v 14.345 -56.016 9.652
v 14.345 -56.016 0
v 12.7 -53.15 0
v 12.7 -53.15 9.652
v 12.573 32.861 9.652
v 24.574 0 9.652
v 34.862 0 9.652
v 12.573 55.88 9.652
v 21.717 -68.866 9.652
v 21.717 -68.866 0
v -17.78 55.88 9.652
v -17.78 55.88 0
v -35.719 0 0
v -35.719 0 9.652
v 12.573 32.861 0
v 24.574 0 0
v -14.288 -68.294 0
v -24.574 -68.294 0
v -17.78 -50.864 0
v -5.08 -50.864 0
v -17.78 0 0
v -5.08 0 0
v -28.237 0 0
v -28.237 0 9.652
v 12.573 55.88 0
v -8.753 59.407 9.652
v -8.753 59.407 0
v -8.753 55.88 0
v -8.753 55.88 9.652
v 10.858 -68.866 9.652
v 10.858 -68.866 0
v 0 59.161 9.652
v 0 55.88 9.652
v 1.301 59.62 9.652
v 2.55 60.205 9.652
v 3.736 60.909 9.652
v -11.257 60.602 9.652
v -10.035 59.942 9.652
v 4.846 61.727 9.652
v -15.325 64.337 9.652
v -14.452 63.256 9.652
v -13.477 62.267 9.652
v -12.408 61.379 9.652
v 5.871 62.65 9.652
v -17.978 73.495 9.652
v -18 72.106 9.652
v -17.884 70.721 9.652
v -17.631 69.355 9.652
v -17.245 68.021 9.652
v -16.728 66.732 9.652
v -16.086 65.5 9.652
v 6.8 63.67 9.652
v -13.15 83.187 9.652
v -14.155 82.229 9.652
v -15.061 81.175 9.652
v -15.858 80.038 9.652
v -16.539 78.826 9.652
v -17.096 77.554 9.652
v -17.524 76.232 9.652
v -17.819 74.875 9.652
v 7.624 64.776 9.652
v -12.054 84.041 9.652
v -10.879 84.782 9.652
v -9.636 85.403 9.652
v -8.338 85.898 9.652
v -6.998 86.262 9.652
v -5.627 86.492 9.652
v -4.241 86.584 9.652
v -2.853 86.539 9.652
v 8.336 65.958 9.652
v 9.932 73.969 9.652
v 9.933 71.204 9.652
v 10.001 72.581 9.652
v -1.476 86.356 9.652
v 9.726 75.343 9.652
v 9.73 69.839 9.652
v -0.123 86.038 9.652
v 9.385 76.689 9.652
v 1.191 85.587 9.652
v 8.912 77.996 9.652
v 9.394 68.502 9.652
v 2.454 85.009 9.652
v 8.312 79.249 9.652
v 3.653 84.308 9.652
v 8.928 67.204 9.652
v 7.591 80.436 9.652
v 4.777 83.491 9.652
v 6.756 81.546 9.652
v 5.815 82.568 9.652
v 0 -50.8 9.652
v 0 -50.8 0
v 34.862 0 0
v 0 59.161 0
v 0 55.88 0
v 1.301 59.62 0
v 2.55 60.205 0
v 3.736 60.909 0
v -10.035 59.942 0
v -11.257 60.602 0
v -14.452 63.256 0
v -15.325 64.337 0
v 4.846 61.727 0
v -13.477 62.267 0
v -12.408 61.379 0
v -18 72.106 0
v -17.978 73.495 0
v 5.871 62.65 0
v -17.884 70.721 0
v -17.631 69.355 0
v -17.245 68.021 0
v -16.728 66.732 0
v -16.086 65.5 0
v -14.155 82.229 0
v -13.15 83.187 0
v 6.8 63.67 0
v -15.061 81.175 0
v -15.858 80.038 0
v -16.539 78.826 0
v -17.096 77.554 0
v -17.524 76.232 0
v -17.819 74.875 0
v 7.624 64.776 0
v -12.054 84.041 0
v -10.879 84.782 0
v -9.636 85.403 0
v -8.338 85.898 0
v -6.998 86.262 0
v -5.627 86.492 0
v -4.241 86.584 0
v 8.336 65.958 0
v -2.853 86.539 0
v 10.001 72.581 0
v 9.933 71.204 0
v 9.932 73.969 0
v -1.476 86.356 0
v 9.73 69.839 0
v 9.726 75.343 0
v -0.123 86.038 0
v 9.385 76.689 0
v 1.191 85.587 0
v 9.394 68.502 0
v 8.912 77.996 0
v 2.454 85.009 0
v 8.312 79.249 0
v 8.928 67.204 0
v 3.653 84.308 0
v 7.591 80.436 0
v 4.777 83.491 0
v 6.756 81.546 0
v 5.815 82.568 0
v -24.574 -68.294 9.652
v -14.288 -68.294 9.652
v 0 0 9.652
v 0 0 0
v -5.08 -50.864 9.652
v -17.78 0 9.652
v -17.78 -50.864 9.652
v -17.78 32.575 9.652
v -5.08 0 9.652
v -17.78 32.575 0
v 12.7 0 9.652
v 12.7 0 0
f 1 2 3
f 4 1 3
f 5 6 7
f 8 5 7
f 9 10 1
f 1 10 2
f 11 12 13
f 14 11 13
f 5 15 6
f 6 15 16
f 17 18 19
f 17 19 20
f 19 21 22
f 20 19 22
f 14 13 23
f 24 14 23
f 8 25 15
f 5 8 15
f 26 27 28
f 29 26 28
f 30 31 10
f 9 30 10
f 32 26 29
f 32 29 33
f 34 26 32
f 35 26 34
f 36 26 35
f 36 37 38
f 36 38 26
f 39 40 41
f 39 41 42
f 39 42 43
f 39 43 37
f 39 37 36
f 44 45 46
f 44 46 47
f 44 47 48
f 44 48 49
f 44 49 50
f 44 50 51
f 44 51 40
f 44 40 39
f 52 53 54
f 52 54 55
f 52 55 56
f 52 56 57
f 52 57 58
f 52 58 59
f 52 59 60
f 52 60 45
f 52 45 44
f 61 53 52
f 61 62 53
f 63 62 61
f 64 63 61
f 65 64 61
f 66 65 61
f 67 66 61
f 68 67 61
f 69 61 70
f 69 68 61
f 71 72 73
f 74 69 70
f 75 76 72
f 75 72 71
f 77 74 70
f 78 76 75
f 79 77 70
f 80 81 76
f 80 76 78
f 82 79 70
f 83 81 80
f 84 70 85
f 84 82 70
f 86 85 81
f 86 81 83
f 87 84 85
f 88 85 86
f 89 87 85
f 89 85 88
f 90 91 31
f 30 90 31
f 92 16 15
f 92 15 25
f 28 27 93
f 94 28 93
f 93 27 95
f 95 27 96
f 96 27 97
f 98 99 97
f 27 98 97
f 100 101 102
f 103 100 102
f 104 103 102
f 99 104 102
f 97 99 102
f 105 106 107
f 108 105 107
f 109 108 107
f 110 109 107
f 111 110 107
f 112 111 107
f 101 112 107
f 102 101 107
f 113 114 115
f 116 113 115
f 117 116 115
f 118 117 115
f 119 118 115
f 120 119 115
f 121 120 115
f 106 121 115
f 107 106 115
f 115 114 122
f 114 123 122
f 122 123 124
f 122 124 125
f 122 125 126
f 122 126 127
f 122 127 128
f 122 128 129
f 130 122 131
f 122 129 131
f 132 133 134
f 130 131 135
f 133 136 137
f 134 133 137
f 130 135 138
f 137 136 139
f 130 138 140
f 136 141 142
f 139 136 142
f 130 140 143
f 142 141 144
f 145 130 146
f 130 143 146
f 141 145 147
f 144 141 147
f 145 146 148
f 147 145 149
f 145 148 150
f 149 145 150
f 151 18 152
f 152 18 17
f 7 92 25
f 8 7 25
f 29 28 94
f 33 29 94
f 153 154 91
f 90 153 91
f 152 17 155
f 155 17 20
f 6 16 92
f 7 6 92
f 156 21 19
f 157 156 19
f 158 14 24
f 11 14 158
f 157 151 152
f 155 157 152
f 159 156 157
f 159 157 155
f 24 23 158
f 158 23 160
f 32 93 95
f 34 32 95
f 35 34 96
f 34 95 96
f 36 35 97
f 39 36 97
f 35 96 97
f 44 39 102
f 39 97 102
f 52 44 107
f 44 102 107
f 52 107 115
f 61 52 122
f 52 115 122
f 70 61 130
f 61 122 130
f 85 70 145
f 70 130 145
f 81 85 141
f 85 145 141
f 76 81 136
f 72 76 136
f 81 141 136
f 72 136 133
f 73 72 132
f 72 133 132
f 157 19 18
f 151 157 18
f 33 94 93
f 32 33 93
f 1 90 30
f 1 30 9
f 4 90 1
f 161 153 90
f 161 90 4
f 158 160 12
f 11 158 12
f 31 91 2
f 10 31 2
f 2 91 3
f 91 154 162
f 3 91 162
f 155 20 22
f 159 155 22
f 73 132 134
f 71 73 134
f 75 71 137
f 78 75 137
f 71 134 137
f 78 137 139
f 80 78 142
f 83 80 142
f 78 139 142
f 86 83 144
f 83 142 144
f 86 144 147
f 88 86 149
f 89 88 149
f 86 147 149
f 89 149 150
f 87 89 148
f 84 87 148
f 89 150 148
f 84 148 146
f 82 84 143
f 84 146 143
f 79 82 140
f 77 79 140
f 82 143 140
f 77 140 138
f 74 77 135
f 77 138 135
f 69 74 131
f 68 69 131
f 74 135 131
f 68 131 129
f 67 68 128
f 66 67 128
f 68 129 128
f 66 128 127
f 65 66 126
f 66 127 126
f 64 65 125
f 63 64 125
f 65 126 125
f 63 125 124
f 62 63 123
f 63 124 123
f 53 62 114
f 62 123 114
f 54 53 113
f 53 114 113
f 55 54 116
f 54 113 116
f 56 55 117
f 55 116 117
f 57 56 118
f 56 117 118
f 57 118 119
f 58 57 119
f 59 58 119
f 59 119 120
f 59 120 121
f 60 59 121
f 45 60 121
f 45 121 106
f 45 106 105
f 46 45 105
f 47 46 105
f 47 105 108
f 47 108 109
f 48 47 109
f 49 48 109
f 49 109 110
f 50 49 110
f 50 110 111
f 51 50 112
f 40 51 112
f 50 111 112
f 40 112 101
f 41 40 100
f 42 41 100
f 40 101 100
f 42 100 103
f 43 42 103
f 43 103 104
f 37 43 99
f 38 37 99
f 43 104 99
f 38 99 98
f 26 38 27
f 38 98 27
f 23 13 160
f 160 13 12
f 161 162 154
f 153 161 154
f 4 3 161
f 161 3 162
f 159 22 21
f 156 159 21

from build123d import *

# Parameters (mm, degrees)
F1_DEPTH = 9.652


with BuildPart() as f1:
    # F0 (on Top) → F1 (new body)
    with BuildSketch(Plane.XY):
        Polygon((12.7, -50.8), (0, -50.8), (10.8585, -68.865746), (21.717001, -68.865746), (14.344779, -56.016282), (12.7, -53.149503), align=None)
        Polygon((-14.287501, -68.294249), (-5.08, -50.863501), (-17.78, -50.863501), (-24.5745, -68.294249), align=None)
        Polygon((-28.237476, 0), (-17.78, 32.575499), (-17.78, 55.88), (-35.71875, 0), align=None)
        Polygon((12.573, 55.88), (12.573, 32.861251), (24.5745, 0), (34.861501, 0), align=None)
        with BuildLine():
            ThreePointArc((-8.752791, 59.406579), (-4.396076, 58.582172), (0, 59.161075))
            ThreePointArc((0, 59.161075), (7.225944, 64.212816), (10.001247, 72.581331))
            ThreePointArc((10.001247, 72.581331), (-12.0538, 84.040913), (-8.752791, 59.406579))
        make_face()
        Polygon((12.573, 0), (0, 0), (0, -50.8), (12.7, -50.8), (12.7, 0), align=None)
        Polygon((-5.08, -50.8), (-5.08, 0), (-17.78, 0), (-17.78, -50.863501), (-5.08, -50.863501), align=None)
        with BuildLine():
            Line((-8.752791, 55.88), (0, 55.88))
            Line((0, 55.88), (0, 59.161075))
            ThreePointArc((0, 59.161075), (-4.396076, 58.582172), (-8.752791, 59.406579))
            Line((-8.752791, 59.406579), (-8.752791, 55.88))
        make_face()
    extrude(amount=F1_DEPTH)


solid = f1.part
